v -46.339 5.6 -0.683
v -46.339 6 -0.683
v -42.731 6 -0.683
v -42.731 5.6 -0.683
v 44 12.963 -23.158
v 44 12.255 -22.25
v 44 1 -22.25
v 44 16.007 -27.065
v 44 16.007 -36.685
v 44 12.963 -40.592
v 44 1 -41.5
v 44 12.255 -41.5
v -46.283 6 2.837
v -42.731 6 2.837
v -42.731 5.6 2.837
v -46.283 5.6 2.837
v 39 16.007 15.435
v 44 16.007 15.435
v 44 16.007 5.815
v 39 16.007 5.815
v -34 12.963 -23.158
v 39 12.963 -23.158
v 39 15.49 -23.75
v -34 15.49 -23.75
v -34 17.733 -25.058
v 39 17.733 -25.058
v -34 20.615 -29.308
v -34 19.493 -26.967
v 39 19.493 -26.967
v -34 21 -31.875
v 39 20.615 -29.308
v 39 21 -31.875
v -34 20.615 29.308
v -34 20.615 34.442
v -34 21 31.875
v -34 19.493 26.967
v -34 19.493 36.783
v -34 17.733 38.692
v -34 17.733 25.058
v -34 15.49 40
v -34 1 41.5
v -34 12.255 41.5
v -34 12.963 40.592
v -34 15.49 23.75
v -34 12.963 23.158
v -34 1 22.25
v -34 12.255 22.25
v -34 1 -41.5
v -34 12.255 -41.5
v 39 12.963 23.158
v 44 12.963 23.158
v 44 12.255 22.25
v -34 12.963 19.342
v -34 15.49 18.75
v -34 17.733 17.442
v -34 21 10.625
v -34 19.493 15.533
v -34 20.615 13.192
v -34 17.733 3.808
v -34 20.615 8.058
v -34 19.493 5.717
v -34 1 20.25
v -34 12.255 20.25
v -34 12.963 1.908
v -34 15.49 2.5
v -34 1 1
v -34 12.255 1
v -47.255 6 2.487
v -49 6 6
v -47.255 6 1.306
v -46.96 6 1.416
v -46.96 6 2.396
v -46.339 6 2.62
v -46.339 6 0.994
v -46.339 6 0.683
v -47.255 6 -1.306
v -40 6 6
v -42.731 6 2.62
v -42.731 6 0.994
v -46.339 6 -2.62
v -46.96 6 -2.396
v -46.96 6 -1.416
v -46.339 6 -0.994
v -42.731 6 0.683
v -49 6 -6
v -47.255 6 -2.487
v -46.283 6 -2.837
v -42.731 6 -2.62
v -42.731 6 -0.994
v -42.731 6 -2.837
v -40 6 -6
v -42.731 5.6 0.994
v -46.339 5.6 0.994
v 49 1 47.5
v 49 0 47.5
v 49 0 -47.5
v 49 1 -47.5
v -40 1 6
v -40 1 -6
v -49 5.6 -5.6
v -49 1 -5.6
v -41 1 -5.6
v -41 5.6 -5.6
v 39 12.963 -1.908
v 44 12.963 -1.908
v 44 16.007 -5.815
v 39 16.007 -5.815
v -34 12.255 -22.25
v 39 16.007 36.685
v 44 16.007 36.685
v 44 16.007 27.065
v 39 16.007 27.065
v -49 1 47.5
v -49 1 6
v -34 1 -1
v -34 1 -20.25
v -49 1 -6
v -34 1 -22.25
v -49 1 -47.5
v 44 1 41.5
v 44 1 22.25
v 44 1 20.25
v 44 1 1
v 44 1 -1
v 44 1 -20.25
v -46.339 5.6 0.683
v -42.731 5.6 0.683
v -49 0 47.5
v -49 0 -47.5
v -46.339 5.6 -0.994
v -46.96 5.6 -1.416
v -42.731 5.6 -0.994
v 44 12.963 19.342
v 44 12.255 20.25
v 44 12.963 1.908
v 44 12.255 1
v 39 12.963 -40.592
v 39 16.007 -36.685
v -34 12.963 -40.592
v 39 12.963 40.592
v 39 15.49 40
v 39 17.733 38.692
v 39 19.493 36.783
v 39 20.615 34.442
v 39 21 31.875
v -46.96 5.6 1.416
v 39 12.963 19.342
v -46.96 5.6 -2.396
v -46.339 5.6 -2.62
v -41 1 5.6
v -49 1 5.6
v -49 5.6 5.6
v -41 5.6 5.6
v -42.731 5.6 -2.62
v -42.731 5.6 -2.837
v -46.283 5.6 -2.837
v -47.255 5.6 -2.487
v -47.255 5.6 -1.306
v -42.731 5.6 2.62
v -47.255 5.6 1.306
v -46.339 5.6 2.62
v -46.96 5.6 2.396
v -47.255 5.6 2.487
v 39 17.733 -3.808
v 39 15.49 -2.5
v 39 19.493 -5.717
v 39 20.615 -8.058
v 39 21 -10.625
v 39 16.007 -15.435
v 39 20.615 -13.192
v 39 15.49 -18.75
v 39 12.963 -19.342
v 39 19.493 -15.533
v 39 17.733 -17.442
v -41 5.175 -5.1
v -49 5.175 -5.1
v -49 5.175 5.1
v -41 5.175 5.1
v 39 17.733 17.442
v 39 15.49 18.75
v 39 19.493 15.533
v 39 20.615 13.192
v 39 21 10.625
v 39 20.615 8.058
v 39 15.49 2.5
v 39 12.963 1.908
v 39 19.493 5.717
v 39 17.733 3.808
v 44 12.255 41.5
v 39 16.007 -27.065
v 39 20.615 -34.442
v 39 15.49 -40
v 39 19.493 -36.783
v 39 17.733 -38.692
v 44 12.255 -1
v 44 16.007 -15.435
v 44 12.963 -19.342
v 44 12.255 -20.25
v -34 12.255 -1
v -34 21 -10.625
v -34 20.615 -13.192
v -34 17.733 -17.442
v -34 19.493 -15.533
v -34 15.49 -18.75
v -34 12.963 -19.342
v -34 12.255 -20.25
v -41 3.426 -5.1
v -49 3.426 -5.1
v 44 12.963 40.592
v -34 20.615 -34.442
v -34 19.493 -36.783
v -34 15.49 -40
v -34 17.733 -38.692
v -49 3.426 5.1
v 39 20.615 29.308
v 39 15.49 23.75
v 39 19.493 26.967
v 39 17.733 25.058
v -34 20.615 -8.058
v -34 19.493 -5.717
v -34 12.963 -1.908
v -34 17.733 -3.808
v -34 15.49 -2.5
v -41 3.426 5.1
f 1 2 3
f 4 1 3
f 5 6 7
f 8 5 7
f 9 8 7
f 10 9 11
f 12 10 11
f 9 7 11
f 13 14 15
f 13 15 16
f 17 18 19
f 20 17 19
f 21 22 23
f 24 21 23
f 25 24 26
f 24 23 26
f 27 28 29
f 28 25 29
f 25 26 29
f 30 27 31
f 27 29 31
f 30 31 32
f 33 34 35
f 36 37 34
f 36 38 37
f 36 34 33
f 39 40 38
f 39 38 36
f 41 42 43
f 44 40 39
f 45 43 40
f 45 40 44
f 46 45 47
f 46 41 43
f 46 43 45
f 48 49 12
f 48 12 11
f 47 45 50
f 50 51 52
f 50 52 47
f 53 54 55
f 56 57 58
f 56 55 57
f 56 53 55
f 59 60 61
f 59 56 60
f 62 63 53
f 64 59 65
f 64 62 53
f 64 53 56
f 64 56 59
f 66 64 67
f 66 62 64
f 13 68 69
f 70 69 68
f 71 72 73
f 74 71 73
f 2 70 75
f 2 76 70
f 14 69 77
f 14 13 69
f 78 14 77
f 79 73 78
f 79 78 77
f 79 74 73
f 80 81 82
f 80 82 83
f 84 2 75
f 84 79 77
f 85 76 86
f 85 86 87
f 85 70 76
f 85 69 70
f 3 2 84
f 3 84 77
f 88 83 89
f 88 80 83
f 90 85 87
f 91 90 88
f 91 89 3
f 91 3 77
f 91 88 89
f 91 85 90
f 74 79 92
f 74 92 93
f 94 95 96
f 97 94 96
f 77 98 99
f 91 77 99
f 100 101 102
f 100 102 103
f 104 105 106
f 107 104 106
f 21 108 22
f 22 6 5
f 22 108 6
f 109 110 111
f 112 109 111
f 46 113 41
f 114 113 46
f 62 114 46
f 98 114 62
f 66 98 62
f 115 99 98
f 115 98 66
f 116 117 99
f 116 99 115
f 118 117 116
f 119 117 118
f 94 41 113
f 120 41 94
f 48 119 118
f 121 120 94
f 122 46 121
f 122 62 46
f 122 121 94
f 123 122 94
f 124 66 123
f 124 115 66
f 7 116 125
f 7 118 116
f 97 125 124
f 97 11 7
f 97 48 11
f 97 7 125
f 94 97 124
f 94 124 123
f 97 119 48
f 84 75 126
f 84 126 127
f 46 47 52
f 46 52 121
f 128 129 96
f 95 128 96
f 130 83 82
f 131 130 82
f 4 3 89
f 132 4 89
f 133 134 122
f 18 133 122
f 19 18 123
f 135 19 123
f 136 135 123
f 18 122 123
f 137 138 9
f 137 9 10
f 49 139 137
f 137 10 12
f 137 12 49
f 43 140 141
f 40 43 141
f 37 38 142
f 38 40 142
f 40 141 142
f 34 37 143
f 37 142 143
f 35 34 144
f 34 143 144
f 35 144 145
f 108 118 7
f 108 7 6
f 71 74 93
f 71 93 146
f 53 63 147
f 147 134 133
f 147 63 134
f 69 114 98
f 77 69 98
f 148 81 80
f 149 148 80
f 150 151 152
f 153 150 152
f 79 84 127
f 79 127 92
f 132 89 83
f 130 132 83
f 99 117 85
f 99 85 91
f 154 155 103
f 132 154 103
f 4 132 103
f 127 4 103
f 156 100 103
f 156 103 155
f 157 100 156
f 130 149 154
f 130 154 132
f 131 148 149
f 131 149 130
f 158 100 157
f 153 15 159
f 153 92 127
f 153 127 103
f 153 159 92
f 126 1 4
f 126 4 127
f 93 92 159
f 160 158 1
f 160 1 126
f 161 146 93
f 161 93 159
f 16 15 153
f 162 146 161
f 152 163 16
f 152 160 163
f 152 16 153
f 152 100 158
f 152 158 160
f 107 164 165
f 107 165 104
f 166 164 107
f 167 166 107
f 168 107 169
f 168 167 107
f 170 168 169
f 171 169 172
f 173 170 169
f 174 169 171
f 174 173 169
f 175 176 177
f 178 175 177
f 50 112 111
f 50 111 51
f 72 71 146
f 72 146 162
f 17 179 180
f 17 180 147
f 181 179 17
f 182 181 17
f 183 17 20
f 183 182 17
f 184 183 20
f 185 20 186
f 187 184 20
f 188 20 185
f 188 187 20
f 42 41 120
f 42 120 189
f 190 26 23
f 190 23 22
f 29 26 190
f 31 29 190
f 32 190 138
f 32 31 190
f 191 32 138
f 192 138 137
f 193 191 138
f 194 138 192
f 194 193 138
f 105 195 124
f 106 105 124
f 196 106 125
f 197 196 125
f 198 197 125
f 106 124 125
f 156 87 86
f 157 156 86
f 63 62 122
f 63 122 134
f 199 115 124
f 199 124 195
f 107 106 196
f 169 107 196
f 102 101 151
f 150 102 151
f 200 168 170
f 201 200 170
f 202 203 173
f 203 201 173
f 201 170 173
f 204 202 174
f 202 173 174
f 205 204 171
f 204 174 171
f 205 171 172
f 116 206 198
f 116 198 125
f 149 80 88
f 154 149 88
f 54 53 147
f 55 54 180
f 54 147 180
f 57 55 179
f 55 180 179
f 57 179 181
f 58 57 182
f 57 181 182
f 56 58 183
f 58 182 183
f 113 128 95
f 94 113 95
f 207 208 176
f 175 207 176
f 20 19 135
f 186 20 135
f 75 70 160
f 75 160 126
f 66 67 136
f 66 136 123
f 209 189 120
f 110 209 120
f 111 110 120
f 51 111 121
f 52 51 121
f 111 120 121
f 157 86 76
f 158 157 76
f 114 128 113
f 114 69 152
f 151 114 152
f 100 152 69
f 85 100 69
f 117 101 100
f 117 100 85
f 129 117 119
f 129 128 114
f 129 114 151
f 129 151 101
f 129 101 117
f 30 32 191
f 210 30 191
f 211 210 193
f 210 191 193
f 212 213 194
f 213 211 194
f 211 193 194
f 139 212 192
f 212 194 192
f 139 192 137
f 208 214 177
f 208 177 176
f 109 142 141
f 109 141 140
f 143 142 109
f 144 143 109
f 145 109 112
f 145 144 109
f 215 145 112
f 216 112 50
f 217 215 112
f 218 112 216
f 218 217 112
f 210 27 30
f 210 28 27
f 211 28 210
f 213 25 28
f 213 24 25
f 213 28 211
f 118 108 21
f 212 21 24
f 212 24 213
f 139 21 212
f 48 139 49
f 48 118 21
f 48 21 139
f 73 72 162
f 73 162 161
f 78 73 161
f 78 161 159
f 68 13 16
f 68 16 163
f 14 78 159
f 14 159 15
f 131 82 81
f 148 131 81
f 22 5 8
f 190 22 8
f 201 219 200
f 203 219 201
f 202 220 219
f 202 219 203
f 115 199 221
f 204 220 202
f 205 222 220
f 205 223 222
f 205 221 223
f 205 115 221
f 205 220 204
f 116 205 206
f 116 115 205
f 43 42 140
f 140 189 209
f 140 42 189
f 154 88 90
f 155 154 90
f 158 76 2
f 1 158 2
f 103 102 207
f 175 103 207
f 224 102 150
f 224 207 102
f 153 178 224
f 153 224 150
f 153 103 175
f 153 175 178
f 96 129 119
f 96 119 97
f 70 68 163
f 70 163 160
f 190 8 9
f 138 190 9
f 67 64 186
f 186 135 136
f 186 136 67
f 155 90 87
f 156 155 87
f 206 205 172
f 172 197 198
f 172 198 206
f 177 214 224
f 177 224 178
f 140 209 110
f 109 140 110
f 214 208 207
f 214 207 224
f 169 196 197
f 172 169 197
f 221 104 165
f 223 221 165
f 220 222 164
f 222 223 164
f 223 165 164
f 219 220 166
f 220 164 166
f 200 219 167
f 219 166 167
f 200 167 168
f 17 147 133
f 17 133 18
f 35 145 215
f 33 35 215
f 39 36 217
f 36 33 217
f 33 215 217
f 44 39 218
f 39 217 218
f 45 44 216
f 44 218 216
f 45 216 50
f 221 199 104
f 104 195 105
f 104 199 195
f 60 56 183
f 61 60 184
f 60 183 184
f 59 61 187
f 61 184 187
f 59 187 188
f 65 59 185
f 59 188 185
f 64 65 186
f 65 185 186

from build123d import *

# Parameters (mm, degrees)
SKETCH_1_W          = 98
SKETCH_1_H          = 95
EXTRUDE_1_DEPTH     = 1
SKETCH_2_W          = 78
SKETCH_2_H          = 85
EXTRUDE_2_DEPTH     = 20
CUT_EXTRUDE_1_DEPTH = 100
CUT_EXTRUDE_2_DEPTH = 5
SKETCH_5_W          = 9
SKETCH_5_H          = 12
EXTRUDE_3_DEPTH     = 5
SKETCH_6_W          = 11.2
SKETCH_6_H          = 4.6
SKETCH_6_W_2        = 10.2
SKETCH_6_H_2        = 1.749108458
CUT_EXTRUDE_4_DEPTH = 8
CUT_EXTRUDE_5_DEPTH = 0.5


with BuildPart() as part:
    # 스케치1 → 보스-돌출1 (new body)
    with BuildSketch(Plane(origin=(0, 0, 0), x_dir=(1, 0, 0), z_dir=(0, 1, 0))):
        Rectangle(SKETCH_1_W, SKETCH_1_H)
    extrude(amount=EXTRUDE_1_DEPTH)

    # 스케치2 → 보스-돌출2 (add)
    with BuildSketch(Plane(origin=(0, 1, 0), x_dir=(1, 0, 0), z_dir=(0, 1, 0))):
        with Locations((5, 0)):
            Rectangle(SKETCH_2_W, SKETCH_2_H)
    extrude(amount=EXTRUDE_2_DEPTH)

    # 스케치4 → 컷-돌출1 (cut)
    with BuildSketch(Plane(origin=(44, 0, 0), x_dir=(0, 0, -1), z_dir=(1, 0, 0))):
        with BuildLine():
            Line((-42.5, 1), (-41.5, 1))
            Line((-41.5, 1), (-41.5, 12.254740451))
            Line((-41.5, 12.254740451), (-40.591554577, 12.962724137))
            ThreePointArc((-40.591554577, 12.962724137), (-37.80324019, 18.684012014), (-31.875, 21))
            Line((-31.875, 21), (-42.5, 21))
            Line((-42.5, 21), (-42.5, 1))
        make_face()
        with BuildLine():
            Line((-22.25, 12.254740451), (-22.25, 1))
            Line((-22.25, 1), (-20.25, 1))
            Line((-20.25, 1), (-20.25, 12.254740451))
            Line((-20.25, 12.254740451), (-19.341554577, 12.962724137))
            ThreePointArc((-19.341554577, 12.962724137), (-16.553240185, 18.684012019), (-10.624999986, 21))
            Line((-10.624999986, 21), (-31.875, 21))
            ThreePointArc((-31.875, 21), (-25.94675981, 18.684012014), (-23.158445423, 12.962724137))
            Line((-23.158445423, 12.962724137), (-22.25, 12.254740451))
        make_face()
        with BuildLine():
            Line((-1, 12.254740451), (-1, 1))
            Line((-1, 1), (1, 1))
            Line((1, 1), (1, 12.254740451))
            Line((1, 12.254740451), (1.908445423, 12.962724137))
            ThreePointArc((1.908445423, 12.962724137), (4.696759796, 18.684012001), (10.62499996, 21))
            Line((10.62499996, 21), (-10.624999986, 21))
            ThreePointArc((-10.624999986, 21), (-4.696759805, 18.68401201), (-1.908445423, 12.962724137))
            Line((-1.908445423, 12.962724137), (-1, 12.254740451))
        make_face()
        with BuildLine():
            Line((20.25, 12.254740451), (20.25, 1))
            Line((20.25, 1), (22.25, 1))
            Line((22.25, 1), (22.25, 12.254740451))
            Line((22.25, 12.254740451), (23.158445423, 12.962724137))
            ThreePointArc((23.158445423, 12.962724137), (25.94675981, 18.684012014), (31.875, 21))
            Line((31.875, 21), (10.62499996, 21))
            ThreePointArc((10.62499996, 21), (16.553240175, 18.684012028), (19.341554577, 12.962724137))
            Line((19.341554577, 12.962724137), (20.25, 12.254740451))
        make_face()
        with BuildLine():
            Line((42.5, 21), (31.875, 21))
            ThreePointArc((31.875, 21), (37.80324019, 18.684012014), (40.591554577, 12.962724137))
            Line((40.591554577, 12.962724137), (41.5, 12.254740451))
            Line((41.5, 12.254740451), (41.5, 1))
            Line((41.5, 1), (42.5, 1))
            Line((42.5, 1), (42.5, 21))
        make_face()
    extrude(amount=-CUT_EXTRUDE_1_DEPTH, mode=Mode.SUBTRACT)

    # 스케치4<3> → 컷-돌출2 (cut)
    with BuildSketch(Plane(origin=(44, 0, 0), x_dir=(0, 0, -1), z_dir=(1, 0, 0))):
        with BuildLine():
            ThreePointArc((-23.158445423, 12.962724137), (-31.875, 21), (-40.591554577, 12.962724137))
            Line((-40.591554577, 12.962724137), (-36.685, 16.007240451))
            Line((-36.685, 16.007240451), (-27.065, 16.007240451))
            Line((-27.065, 16.007240451), (-23.158445423, 12.962724137))
        make_face()
        with BuildLine():
            Line((-5.815, 16.007240451), (-1.908445423, 12.962724137))
            ThreePointArc((-1.908445423, 12.962724137), (-10.625, 21), (-19.341554577, 12.962724137))
            Line((-19.341554577, 12.962724137), (-15.435, 16.007240451))
            Line((-15.435, 16.007240451), (-5.815, 16.007240451))
        make_face()
        with BuildLine():
            Line((15.435, 16.007240451), (19.341554577, 12.962724137))
            ThreePointArc((19.341554577, 12.962724137), (10.625, 21), (1.908445423, 12.962724137))
            Line((1.908445423, 12.962724137), (5.815, 16.007240451))
            Line((5.815, 16.007240451), (15.435, 16.007240451))
        make_face()
        with BuildLine():
            Line((36.685, 16.007240451), (40.591554577, 12.962724137))
            ThreePointArc((40.591554577, 12.962724137), (31.875, 21), (23.158445423, 12.962724137))
            Line((23.158445423, 12.962724137), (27.065, 16.007240451))
            Line((27.065, 16.007240451), (36.685, 16.007240451))
        make_face()
    extrude(amount=-CUT_EXTRUDE_2_DEPTH, mode=Mode.SUBTRACT)

    # 스케치5 → 보스-돌출3 (add)
    with BuildSketch(Plane(origin=(0, 1, 0), x_dir=(1, 0, 0), z_dir=(0, 1, 0))):
        with Locations((-44.5, 0)):
            Rectangle(SKETCH_5_W, SKETCH_5_H)
    extrude(amount=EXTRUDE_3_DEPTH)

    # 스케치6 → 컷-돌출4 (cut)
    with BuildSketch(Plane.ZY.offset(49)):
        with Locations((0, 3.3)):
            Rectangle(SKETCH_6_W, SKETCH_6_H)
        with Locations((0, 4.300145796)):
            Rectangle(SKETCH_6_W_2, SKETCH_6_H_2, mode=Mode.SUBTRACT)
    extrude(amount=-CUT_EXTRUDE_4_DEPTH, mode=Mode.SUBTRACT)

    # 스케치7 → 컷-돌출5 (cut)
    with BuildSketch(Plane(origin=(0, 6, 0), x_dir=(1, 0, 0), z_dir=(0, 1, 0))):
        Polygon((-42.731367286, 2.836850655), (-46.283445156, 2.836850655), (-47.255371975, 2.487236692), (-47.255371975, 1.305541495), (-46.33938339, 0.68322864), (-42.731367286, 0.68322864), (-42.731367286, 0.994385067), (-46.33938339, 0.994385067), (-46.960091467, 1.416087501), (-46.960091467, 2.396337061), (-46.33938339, 2.619613348), (-42.731367286, 2.619613348), align=None)
        Polygon((-42.731367286, -2.836850655), (-46.283445156, -2.836850655), (-47.255371975, -2.487236692), (-47.255371975, -1.305541495), (-46.33938339, -0.68322864), (-42.731367286, -0.68322864), (-42.731367286, -0.994385067), (-46.33938339, -0.994385067), (-46.960091467, -1.416087501), (-46.960091467, -2.396337061), (-46.33938339, -2.619613348), (-42.731367286, -2.619613348), align=None)
    extrude(amount=-CUT_EXTRUDE_5_DEPTH, mode=Mode.SUBTRACT)


solid = part.part
